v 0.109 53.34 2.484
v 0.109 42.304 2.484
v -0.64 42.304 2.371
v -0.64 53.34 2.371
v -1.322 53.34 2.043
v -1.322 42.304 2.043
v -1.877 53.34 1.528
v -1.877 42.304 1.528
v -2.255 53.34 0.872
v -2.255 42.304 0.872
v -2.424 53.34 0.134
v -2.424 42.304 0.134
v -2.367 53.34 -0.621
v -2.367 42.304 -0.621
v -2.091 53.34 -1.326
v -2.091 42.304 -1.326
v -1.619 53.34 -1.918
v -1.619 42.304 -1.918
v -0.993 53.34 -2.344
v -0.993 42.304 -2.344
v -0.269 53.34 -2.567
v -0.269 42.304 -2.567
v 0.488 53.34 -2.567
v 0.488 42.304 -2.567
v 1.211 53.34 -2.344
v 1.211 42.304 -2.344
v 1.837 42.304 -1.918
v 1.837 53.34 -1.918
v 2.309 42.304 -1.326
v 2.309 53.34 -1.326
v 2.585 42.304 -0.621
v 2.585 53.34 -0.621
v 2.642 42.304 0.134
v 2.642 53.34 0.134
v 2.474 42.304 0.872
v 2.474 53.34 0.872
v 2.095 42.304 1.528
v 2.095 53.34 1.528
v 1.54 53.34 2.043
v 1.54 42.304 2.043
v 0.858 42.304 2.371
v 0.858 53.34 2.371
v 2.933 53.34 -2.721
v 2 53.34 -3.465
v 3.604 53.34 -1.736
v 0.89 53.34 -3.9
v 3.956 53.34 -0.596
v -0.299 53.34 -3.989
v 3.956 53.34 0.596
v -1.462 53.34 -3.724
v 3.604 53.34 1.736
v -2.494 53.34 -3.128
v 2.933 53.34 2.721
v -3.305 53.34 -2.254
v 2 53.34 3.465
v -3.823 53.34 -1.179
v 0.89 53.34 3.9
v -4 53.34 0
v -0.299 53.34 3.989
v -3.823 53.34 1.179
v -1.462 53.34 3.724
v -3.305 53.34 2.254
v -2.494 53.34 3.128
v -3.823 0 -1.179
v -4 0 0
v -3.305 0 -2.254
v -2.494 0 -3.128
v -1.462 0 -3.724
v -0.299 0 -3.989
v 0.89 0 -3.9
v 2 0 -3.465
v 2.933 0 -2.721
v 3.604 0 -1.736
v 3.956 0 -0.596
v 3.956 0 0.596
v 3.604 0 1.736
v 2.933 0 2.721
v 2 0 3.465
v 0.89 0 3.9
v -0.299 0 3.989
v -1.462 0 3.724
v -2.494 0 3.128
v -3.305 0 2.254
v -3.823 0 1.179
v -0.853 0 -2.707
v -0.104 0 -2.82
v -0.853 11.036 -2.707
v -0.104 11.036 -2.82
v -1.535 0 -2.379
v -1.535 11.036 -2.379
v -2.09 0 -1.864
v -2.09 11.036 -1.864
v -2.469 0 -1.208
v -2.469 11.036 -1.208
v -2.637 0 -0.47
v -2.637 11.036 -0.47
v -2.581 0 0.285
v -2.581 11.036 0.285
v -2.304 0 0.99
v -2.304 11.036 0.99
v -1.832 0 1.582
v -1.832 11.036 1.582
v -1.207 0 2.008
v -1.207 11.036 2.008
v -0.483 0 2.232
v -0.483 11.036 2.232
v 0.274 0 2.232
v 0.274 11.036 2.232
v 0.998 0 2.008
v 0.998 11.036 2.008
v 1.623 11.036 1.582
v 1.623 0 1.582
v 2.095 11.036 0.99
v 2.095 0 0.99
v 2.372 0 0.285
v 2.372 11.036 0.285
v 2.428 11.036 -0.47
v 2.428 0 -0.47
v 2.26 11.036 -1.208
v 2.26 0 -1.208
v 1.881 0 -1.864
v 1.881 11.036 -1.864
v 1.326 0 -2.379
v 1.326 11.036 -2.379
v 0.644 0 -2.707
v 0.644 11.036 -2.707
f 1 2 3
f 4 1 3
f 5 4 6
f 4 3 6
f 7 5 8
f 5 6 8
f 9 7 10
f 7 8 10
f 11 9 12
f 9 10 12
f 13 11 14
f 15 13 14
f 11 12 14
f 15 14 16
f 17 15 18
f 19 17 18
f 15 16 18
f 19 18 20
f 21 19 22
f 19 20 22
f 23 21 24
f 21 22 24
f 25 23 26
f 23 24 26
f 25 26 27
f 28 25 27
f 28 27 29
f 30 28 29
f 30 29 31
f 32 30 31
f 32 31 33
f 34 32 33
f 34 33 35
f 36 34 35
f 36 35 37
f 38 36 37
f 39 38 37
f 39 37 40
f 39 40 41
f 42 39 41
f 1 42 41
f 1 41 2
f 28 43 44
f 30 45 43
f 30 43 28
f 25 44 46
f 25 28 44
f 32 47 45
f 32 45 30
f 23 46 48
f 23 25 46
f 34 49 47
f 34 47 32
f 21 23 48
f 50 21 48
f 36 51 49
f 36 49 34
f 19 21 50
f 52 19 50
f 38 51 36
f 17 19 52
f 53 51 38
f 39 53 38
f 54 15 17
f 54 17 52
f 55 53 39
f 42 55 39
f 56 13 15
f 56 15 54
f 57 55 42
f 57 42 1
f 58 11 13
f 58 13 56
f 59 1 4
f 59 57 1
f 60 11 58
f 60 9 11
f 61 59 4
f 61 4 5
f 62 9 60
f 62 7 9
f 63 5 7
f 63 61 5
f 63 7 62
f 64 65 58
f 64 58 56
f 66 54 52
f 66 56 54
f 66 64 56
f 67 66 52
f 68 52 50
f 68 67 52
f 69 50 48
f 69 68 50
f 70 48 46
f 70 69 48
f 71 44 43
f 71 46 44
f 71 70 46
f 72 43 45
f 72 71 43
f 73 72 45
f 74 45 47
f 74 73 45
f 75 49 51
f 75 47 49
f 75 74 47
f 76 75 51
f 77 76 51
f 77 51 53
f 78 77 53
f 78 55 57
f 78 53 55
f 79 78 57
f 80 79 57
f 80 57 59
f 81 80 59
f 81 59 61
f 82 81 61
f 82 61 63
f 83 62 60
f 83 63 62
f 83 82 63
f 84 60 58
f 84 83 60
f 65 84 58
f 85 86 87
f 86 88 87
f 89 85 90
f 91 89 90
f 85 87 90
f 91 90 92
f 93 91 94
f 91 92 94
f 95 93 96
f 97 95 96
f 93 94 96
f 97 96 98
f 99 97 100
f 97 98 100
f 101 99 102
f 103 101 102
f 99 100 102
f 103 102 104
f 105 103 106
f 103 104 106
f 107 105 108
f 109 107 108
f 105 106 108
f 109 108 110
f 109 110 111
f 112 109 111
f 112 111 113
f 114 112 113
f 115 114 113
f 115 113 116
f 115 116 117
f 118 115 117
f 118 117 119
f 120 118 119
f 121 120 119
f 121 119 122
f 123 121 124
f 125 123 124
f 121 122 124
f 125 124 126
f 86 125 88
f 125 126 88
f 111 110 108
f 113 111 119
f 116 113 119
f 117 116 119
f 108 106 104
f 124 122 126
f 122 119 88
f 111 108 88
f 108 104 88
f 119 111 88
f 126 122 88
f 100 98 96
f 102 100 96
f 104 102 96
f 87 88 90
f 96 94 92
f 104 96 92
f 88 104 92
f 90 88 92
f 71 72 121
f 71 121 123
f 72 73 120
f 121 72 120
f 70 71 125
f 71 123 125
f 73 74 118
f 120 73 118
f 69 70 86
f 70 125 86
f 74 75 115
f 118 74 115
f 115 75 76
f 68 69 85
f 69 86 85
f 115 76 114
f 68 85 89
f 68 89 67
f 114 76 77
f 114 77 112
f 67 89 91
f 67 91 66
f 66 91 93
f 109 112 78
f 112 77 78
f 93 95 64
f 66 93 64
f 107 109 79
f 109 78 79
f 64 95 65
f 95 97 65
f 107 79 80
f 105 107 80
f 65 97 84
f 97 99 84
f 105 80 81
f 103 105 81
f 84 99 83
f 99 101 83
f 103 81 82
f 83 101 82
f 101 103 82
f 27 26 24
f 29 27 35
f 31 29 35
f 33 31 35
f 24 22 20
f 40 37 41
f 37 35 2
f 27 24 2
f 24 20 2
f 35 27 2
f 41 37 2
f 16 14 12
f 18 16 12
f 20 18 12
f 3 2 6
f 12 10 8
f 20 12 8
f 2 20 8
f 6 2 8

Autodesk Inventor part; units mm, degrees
ref_plane "YZ Plane" through (0, 0, 0) normal (1, 0, 0) x (0, 1, 0)
ref_plane "XZ Plane" through (0, 0, 0) normal (0, 1, 0) x (-1, 0, 0)
sketch "Sketch1" plane through (0, 0, 0) normal (0, 1, 0) x (-1, 0, 0)
  circle A0 centre (0, 0) radius 4.0005
  dimension "d0" = 8.001
extrude "Extrusion1" add sketch "Sketch1" along normal blind 53.34
ref_plane "Work Plane1" through (0, 26.67, 0) normal (0, -1, 0) x (1, 0, 0)
sketch "Sketch3" plane through (0, 0, 0) normal (0, -1, 0) x (1, 0, 0)
  point P0 (0, 0)
  point P1 (-0.1045, -0.2801)
hole "Hole1" at (-0.1045, 0, -0.2801) direction (0, 1, 0) diameter 5.08 depth 11.0363
sketch "Sketch4" plane through (0, 53.34, 0) normal (0, 1, 0) x (1, 0, 0)
  point P0 (0, 0)
  point P1 (0.1091, 0.0558)
hole "Hole2" at (0.1091, 53.34, -0.0558) direction (0, -1, 0) diameter 5.08 depth 11.0363
properties part number "central rotator claw grabber_3DPrint"
